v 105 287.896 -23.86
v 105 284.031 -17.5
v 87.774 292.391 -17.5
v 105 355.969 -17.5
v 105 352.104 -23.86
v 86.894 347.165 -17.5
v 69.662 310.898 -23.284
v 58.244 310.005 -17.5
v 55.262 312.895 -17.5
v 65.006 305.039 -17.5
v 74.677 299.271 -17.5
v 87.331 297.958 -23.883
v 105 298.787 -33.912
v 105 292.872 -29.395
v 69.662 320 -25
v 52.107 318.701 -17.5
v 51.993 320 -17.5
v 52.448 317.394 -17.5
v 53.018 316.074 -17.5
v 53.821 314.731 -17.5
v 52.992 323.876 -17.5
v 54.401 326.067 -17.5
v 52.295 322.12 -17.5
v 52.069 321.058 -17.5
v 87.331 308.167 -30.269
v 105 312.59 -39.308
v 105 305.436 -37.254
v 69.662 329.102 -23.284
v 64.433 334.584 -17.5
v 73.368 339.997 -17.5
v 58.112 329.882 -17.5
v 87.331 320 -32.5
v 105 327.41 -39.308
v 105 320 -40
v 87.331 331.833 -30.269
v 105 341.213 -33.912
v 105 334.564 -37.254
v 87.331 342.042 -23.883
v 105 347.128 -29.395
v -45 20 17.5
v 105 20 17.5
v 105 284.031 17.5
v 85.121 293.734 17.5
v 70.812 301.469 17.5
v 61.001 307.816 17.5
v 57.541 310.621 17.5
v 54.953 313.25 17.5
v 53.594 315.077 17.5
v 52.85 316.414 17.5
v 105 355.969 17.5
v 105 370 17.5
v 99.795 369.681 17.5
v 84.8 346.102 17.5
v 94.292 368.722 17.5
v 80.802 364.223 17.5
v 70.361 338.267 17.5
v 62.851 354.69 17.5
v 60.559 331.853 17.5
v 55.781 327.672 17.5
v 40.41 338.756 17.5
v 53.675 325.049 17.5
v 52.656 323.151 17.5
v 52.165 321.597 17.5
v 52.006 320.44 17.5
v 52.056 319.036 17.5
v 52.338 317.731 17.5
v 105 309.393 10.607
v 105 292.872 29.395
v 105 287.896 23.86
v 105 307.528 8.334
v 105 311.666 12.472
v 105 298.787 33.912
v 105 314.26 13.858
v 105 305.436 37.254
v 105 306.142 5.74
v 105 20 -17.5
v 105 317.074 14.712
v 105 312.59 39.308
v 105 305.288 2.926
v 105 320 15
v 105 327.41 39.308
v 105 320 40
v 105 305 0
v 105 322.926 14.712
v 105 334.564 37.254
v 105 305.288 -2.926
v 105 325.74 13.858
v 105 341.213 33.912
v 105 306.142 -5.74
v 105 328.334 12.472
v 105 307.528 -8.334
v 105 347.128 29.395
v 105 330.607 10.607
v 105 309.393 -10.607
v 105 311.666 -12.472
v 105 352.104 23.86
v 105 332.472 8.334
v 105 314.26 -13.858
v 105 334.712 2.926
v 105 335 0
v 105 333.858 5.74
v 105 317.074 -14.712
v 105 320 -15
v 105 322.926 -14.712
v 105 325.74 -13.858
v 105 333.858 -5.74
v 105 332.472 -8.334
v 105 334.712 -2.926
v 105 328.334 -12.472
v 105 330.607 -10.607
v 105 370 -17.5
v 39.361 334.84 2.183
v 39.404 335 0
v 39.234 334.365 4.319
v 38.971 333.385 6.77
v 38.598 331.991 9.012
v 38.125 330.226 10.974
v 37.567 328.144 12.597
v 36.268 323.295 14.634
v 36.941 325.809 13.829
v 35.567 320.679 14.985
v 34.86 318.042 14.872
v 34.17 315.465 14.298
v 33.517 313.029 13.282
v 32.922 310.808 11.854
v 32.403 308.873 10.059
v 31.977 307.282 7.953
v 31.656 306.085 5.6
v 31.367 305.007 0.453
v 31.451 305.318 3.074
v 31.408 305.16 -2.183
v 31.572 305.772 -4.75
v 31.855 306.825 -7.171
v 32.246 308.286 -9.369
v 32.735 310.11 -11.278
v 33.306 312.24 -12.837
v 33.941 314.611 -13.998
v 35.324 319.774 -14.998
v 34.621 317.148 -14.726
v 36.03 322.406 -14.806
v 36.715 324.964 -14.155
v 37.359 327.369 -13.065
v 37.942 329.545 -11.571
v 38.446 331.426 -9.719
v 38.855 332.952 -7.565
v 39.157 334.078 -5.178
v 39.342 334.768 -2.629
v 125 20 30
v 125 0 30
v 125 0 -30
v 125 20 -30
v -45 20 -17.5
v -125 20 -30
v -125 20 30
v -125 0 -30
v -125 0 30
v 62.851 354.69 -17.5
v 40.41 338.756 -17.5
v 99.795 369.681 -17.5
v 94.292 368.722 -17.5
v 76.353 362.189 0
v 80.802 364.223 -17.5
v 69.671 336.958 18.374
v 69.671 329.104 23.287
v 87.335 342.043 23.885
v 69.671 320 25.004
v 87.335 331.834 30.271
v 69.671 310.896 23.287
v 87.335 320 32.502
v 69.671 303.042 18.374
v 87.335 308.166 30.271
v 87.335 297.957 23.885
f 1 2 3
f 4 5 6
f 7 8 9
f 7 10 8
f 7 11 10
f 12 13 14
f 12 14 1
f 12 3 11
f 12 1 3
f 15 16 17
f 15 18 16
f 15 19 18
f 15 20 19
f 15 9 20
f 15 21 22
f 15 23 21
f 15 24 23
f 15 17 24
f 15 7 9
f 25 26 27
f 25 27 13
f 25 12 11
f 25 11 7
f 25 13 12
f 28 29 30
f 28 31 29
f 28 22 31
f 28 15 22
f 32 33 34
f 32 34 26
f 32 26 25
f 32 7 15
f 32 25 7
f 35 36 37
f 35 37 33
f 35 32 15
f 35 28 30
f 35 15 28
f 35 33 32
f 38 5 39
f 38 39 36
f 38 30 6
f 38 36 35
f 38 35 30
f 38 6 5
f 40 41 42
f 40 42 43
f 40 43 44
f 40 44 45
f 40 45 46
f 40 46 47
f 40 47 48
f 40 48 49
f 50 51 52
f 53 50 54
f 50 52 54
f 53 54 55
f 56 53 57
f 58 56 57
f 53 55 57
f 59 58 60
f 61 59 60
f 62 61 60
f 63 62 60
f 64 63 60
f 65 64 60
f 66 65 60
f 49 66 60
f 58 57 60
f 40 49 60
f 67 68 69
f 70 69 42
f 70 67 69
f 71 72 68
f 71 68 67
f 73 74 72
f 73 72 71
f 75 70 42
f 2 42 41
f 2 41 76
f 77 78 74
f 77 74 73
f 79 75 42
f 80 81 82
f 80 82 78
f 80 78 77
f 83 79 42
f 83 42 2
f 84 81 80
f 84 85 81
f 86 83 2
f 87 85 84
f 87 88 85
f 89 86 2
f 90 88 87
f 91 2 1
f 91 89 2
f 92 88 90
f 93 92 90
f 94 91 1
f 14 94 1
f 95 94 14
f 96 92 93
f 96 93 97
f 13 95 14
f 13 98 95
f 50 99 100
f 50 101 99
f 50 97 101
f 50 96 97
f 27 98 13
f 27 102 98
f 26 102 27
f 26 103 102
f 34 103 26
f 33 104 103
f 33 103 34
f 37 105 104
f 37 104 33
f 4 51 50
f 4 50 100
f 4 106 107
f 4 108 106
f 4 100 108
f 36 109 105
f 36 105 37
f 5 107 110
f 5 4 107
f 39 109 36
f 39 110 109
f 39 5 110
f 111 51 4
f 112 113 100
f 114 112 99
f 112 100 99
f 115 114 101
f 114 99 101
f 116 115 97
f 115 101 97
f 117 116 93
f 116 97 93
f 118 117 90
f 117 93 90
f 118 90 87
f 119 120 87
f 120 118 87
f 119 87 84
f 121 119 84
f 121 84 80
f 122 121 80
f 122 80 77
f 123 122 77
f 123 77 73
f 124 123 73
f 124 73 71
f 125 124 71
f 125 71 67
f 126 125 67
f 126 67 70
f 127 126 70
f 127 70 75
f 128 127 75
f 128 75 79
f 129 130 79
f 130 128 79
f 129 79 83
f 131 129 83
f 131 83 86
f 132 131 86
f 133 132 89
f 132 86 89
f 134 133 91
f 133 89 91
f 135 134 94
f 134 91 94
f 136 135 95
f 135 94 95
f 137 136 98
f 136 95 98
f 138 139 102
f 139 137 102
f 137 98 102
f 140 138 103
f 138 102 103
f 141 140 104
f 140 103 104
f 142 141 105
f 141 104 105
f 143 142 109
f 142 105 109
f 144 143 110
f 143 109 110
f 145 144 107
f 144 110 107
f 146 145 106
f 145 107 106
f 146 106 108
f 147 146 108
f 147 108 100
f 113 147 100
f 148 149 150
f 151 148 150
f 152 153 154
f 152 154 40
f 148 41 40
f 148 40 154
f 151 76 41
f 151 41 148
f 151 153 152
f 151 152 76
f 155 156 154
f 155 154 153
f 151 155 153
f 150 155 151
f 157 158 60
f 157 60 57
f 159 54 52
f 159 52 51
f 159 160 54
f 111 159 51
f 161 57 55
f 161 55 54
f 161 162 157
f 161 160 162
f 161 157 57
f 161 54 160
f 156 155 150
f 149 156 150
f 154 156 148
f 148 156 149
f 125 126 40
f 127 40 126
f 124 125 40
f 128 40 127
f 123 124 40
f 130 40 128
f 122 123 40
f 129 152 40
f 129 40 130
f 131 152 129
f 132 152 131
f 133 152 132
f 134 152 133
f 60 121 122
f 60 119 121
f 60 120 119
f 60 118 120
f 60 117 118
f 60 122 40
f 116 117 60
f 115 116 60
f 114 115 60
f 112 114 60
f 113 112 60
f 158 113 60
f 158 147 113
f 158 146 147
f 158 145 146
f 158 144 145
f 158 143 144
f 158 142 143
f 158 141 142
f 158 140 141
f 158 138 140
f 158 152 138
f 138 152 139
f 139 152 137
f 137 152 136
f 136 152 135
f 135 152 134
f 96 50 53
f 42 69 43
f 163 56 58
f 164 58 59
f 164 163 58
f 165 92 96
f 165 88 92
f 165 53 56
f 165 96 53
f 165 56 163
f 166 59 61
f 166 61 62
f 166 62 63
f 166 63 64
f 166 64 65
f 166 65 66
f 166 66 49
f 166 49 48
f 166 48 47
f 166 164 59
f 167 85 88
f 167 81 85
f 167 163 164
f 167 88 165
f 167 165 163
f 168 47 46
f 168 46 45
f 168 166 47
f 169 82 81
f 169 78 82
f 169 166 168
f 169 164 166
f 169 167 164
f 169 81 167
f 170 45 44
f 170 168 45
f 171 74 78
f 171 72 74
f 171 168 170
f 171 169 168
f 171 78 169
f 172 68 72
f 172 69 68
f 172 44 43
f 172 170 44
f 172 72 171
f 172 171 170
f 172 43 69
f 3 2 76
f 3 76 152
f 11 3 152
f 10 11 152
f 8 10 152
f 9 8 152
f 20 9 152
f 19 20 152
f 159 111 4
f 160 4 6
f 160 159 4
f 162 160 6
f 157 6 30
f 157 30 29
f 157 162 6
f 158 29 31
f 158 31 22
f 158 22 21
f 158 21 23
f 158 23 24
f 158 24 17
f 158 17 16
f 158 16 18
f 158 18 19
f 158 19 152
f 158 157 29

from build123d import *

# Parameters (mm, degrees)
SKETCH1_W                = 250
SKETCH1_H                = 60
BOSS_EXTRUDE1_DEPTH      = 20
BOSS_EXTRUDE3_DEPTH      = 17.5
BOSS_EXTRUDE3_DEPTH_BACK = 17.5
SKETCH4_R                = 40
BOSS_EXTRUDE5_DEPTH      = 80
BOSS_EXTRUDE5_DRAFT      = -23
SKETCH4_4_R              = 15
CUT_EXTRUDE3_DEPTH       = 168


with BuildPart() as part:
    # Sketch1 → Boss-Extrude1 (new body)
    with BuildSketch(Plane(origin=(0, 0, 0), x_dir=(1, 0, 0), z_dir=(0, 1, 0))):
        Rectangle(SKETCH1_W, SKETCH1_H)
    extrude(amount=BOSS_EXTRUDE1_DEPTH)

    # Sketch3 → Boss-Extrude3 (add, two sides: drawn at the far end of the back side and taken through both)
    with BuildSketch(Plane.XY.offset(-BOSS_EXTRUDE3_DEPTH_BACK)):
        with BuildLine():
            Line((105, 20), (-45, 20))
            Line((-45, 20), (40.410284884, 338.755522675))
            add(Edge.make_bspline(
                [(40.410284884, 338.755522675), (80, 370), (105, 370)],
                knots=[0, 0, 0, 1, 1, 1], degree=2))
            Line((105, 370), (105, 20))
        make_face()
    extrude(amount=BOSS_EXTRUDE3_DEPTH + BOSS_EXTRUDE3_DEPTH_BACK)


with BuildPart() as boss_extrude5_tool:
    # Sketch4 → Boss-Extrude5 (with draft: the straight prism first)
    with BuildSketch(Plane(origin=(105, 0, 0), x_dir=(0, 0, -1), z_dir=(1, 0, 0))):
        with Locations((0, 320)):
            Circle(SKETCH4_R)
    extrude(amount=-BOSS_EXTRUDE5_DEPTH)
    # Boss-Extrude5: the draft: its side faces are tilted about the plane it starts from
    boss_extrude5_sides = [boss_extrude5_tool.faces().sort_by_distance(p)[0] for p in [
        (65, 320, 40),
    ]]
    draft(boss_extrude5_sides, Plane(origin=(105, 0, 0), x_dir=(0, 0, -1), z_dir=(1, 0, 0)), BOSS_EXTRUDE5_DRAFT)


with BuildPart() as part_1:
    add(part.part)

    # Boss-Extrude5: add boss_extrude5_tool
    add(boss_extrude5_tool.part)

    # Sketch4<4> → Cut-Extrude3 (cut)
    with BuildSketch(Plane(origin=(105, 0, 0), x_dir=(0, 0, -1), z_dir=(1, 0, 0))):
        with Locations((0, 320)):
            Circle(SKETCH4_4_R)
    extrude(amount=-CUT_EXTRUDE3_DEPTH, mode=Mode.SUBTRACT)


solid = part_1.part
